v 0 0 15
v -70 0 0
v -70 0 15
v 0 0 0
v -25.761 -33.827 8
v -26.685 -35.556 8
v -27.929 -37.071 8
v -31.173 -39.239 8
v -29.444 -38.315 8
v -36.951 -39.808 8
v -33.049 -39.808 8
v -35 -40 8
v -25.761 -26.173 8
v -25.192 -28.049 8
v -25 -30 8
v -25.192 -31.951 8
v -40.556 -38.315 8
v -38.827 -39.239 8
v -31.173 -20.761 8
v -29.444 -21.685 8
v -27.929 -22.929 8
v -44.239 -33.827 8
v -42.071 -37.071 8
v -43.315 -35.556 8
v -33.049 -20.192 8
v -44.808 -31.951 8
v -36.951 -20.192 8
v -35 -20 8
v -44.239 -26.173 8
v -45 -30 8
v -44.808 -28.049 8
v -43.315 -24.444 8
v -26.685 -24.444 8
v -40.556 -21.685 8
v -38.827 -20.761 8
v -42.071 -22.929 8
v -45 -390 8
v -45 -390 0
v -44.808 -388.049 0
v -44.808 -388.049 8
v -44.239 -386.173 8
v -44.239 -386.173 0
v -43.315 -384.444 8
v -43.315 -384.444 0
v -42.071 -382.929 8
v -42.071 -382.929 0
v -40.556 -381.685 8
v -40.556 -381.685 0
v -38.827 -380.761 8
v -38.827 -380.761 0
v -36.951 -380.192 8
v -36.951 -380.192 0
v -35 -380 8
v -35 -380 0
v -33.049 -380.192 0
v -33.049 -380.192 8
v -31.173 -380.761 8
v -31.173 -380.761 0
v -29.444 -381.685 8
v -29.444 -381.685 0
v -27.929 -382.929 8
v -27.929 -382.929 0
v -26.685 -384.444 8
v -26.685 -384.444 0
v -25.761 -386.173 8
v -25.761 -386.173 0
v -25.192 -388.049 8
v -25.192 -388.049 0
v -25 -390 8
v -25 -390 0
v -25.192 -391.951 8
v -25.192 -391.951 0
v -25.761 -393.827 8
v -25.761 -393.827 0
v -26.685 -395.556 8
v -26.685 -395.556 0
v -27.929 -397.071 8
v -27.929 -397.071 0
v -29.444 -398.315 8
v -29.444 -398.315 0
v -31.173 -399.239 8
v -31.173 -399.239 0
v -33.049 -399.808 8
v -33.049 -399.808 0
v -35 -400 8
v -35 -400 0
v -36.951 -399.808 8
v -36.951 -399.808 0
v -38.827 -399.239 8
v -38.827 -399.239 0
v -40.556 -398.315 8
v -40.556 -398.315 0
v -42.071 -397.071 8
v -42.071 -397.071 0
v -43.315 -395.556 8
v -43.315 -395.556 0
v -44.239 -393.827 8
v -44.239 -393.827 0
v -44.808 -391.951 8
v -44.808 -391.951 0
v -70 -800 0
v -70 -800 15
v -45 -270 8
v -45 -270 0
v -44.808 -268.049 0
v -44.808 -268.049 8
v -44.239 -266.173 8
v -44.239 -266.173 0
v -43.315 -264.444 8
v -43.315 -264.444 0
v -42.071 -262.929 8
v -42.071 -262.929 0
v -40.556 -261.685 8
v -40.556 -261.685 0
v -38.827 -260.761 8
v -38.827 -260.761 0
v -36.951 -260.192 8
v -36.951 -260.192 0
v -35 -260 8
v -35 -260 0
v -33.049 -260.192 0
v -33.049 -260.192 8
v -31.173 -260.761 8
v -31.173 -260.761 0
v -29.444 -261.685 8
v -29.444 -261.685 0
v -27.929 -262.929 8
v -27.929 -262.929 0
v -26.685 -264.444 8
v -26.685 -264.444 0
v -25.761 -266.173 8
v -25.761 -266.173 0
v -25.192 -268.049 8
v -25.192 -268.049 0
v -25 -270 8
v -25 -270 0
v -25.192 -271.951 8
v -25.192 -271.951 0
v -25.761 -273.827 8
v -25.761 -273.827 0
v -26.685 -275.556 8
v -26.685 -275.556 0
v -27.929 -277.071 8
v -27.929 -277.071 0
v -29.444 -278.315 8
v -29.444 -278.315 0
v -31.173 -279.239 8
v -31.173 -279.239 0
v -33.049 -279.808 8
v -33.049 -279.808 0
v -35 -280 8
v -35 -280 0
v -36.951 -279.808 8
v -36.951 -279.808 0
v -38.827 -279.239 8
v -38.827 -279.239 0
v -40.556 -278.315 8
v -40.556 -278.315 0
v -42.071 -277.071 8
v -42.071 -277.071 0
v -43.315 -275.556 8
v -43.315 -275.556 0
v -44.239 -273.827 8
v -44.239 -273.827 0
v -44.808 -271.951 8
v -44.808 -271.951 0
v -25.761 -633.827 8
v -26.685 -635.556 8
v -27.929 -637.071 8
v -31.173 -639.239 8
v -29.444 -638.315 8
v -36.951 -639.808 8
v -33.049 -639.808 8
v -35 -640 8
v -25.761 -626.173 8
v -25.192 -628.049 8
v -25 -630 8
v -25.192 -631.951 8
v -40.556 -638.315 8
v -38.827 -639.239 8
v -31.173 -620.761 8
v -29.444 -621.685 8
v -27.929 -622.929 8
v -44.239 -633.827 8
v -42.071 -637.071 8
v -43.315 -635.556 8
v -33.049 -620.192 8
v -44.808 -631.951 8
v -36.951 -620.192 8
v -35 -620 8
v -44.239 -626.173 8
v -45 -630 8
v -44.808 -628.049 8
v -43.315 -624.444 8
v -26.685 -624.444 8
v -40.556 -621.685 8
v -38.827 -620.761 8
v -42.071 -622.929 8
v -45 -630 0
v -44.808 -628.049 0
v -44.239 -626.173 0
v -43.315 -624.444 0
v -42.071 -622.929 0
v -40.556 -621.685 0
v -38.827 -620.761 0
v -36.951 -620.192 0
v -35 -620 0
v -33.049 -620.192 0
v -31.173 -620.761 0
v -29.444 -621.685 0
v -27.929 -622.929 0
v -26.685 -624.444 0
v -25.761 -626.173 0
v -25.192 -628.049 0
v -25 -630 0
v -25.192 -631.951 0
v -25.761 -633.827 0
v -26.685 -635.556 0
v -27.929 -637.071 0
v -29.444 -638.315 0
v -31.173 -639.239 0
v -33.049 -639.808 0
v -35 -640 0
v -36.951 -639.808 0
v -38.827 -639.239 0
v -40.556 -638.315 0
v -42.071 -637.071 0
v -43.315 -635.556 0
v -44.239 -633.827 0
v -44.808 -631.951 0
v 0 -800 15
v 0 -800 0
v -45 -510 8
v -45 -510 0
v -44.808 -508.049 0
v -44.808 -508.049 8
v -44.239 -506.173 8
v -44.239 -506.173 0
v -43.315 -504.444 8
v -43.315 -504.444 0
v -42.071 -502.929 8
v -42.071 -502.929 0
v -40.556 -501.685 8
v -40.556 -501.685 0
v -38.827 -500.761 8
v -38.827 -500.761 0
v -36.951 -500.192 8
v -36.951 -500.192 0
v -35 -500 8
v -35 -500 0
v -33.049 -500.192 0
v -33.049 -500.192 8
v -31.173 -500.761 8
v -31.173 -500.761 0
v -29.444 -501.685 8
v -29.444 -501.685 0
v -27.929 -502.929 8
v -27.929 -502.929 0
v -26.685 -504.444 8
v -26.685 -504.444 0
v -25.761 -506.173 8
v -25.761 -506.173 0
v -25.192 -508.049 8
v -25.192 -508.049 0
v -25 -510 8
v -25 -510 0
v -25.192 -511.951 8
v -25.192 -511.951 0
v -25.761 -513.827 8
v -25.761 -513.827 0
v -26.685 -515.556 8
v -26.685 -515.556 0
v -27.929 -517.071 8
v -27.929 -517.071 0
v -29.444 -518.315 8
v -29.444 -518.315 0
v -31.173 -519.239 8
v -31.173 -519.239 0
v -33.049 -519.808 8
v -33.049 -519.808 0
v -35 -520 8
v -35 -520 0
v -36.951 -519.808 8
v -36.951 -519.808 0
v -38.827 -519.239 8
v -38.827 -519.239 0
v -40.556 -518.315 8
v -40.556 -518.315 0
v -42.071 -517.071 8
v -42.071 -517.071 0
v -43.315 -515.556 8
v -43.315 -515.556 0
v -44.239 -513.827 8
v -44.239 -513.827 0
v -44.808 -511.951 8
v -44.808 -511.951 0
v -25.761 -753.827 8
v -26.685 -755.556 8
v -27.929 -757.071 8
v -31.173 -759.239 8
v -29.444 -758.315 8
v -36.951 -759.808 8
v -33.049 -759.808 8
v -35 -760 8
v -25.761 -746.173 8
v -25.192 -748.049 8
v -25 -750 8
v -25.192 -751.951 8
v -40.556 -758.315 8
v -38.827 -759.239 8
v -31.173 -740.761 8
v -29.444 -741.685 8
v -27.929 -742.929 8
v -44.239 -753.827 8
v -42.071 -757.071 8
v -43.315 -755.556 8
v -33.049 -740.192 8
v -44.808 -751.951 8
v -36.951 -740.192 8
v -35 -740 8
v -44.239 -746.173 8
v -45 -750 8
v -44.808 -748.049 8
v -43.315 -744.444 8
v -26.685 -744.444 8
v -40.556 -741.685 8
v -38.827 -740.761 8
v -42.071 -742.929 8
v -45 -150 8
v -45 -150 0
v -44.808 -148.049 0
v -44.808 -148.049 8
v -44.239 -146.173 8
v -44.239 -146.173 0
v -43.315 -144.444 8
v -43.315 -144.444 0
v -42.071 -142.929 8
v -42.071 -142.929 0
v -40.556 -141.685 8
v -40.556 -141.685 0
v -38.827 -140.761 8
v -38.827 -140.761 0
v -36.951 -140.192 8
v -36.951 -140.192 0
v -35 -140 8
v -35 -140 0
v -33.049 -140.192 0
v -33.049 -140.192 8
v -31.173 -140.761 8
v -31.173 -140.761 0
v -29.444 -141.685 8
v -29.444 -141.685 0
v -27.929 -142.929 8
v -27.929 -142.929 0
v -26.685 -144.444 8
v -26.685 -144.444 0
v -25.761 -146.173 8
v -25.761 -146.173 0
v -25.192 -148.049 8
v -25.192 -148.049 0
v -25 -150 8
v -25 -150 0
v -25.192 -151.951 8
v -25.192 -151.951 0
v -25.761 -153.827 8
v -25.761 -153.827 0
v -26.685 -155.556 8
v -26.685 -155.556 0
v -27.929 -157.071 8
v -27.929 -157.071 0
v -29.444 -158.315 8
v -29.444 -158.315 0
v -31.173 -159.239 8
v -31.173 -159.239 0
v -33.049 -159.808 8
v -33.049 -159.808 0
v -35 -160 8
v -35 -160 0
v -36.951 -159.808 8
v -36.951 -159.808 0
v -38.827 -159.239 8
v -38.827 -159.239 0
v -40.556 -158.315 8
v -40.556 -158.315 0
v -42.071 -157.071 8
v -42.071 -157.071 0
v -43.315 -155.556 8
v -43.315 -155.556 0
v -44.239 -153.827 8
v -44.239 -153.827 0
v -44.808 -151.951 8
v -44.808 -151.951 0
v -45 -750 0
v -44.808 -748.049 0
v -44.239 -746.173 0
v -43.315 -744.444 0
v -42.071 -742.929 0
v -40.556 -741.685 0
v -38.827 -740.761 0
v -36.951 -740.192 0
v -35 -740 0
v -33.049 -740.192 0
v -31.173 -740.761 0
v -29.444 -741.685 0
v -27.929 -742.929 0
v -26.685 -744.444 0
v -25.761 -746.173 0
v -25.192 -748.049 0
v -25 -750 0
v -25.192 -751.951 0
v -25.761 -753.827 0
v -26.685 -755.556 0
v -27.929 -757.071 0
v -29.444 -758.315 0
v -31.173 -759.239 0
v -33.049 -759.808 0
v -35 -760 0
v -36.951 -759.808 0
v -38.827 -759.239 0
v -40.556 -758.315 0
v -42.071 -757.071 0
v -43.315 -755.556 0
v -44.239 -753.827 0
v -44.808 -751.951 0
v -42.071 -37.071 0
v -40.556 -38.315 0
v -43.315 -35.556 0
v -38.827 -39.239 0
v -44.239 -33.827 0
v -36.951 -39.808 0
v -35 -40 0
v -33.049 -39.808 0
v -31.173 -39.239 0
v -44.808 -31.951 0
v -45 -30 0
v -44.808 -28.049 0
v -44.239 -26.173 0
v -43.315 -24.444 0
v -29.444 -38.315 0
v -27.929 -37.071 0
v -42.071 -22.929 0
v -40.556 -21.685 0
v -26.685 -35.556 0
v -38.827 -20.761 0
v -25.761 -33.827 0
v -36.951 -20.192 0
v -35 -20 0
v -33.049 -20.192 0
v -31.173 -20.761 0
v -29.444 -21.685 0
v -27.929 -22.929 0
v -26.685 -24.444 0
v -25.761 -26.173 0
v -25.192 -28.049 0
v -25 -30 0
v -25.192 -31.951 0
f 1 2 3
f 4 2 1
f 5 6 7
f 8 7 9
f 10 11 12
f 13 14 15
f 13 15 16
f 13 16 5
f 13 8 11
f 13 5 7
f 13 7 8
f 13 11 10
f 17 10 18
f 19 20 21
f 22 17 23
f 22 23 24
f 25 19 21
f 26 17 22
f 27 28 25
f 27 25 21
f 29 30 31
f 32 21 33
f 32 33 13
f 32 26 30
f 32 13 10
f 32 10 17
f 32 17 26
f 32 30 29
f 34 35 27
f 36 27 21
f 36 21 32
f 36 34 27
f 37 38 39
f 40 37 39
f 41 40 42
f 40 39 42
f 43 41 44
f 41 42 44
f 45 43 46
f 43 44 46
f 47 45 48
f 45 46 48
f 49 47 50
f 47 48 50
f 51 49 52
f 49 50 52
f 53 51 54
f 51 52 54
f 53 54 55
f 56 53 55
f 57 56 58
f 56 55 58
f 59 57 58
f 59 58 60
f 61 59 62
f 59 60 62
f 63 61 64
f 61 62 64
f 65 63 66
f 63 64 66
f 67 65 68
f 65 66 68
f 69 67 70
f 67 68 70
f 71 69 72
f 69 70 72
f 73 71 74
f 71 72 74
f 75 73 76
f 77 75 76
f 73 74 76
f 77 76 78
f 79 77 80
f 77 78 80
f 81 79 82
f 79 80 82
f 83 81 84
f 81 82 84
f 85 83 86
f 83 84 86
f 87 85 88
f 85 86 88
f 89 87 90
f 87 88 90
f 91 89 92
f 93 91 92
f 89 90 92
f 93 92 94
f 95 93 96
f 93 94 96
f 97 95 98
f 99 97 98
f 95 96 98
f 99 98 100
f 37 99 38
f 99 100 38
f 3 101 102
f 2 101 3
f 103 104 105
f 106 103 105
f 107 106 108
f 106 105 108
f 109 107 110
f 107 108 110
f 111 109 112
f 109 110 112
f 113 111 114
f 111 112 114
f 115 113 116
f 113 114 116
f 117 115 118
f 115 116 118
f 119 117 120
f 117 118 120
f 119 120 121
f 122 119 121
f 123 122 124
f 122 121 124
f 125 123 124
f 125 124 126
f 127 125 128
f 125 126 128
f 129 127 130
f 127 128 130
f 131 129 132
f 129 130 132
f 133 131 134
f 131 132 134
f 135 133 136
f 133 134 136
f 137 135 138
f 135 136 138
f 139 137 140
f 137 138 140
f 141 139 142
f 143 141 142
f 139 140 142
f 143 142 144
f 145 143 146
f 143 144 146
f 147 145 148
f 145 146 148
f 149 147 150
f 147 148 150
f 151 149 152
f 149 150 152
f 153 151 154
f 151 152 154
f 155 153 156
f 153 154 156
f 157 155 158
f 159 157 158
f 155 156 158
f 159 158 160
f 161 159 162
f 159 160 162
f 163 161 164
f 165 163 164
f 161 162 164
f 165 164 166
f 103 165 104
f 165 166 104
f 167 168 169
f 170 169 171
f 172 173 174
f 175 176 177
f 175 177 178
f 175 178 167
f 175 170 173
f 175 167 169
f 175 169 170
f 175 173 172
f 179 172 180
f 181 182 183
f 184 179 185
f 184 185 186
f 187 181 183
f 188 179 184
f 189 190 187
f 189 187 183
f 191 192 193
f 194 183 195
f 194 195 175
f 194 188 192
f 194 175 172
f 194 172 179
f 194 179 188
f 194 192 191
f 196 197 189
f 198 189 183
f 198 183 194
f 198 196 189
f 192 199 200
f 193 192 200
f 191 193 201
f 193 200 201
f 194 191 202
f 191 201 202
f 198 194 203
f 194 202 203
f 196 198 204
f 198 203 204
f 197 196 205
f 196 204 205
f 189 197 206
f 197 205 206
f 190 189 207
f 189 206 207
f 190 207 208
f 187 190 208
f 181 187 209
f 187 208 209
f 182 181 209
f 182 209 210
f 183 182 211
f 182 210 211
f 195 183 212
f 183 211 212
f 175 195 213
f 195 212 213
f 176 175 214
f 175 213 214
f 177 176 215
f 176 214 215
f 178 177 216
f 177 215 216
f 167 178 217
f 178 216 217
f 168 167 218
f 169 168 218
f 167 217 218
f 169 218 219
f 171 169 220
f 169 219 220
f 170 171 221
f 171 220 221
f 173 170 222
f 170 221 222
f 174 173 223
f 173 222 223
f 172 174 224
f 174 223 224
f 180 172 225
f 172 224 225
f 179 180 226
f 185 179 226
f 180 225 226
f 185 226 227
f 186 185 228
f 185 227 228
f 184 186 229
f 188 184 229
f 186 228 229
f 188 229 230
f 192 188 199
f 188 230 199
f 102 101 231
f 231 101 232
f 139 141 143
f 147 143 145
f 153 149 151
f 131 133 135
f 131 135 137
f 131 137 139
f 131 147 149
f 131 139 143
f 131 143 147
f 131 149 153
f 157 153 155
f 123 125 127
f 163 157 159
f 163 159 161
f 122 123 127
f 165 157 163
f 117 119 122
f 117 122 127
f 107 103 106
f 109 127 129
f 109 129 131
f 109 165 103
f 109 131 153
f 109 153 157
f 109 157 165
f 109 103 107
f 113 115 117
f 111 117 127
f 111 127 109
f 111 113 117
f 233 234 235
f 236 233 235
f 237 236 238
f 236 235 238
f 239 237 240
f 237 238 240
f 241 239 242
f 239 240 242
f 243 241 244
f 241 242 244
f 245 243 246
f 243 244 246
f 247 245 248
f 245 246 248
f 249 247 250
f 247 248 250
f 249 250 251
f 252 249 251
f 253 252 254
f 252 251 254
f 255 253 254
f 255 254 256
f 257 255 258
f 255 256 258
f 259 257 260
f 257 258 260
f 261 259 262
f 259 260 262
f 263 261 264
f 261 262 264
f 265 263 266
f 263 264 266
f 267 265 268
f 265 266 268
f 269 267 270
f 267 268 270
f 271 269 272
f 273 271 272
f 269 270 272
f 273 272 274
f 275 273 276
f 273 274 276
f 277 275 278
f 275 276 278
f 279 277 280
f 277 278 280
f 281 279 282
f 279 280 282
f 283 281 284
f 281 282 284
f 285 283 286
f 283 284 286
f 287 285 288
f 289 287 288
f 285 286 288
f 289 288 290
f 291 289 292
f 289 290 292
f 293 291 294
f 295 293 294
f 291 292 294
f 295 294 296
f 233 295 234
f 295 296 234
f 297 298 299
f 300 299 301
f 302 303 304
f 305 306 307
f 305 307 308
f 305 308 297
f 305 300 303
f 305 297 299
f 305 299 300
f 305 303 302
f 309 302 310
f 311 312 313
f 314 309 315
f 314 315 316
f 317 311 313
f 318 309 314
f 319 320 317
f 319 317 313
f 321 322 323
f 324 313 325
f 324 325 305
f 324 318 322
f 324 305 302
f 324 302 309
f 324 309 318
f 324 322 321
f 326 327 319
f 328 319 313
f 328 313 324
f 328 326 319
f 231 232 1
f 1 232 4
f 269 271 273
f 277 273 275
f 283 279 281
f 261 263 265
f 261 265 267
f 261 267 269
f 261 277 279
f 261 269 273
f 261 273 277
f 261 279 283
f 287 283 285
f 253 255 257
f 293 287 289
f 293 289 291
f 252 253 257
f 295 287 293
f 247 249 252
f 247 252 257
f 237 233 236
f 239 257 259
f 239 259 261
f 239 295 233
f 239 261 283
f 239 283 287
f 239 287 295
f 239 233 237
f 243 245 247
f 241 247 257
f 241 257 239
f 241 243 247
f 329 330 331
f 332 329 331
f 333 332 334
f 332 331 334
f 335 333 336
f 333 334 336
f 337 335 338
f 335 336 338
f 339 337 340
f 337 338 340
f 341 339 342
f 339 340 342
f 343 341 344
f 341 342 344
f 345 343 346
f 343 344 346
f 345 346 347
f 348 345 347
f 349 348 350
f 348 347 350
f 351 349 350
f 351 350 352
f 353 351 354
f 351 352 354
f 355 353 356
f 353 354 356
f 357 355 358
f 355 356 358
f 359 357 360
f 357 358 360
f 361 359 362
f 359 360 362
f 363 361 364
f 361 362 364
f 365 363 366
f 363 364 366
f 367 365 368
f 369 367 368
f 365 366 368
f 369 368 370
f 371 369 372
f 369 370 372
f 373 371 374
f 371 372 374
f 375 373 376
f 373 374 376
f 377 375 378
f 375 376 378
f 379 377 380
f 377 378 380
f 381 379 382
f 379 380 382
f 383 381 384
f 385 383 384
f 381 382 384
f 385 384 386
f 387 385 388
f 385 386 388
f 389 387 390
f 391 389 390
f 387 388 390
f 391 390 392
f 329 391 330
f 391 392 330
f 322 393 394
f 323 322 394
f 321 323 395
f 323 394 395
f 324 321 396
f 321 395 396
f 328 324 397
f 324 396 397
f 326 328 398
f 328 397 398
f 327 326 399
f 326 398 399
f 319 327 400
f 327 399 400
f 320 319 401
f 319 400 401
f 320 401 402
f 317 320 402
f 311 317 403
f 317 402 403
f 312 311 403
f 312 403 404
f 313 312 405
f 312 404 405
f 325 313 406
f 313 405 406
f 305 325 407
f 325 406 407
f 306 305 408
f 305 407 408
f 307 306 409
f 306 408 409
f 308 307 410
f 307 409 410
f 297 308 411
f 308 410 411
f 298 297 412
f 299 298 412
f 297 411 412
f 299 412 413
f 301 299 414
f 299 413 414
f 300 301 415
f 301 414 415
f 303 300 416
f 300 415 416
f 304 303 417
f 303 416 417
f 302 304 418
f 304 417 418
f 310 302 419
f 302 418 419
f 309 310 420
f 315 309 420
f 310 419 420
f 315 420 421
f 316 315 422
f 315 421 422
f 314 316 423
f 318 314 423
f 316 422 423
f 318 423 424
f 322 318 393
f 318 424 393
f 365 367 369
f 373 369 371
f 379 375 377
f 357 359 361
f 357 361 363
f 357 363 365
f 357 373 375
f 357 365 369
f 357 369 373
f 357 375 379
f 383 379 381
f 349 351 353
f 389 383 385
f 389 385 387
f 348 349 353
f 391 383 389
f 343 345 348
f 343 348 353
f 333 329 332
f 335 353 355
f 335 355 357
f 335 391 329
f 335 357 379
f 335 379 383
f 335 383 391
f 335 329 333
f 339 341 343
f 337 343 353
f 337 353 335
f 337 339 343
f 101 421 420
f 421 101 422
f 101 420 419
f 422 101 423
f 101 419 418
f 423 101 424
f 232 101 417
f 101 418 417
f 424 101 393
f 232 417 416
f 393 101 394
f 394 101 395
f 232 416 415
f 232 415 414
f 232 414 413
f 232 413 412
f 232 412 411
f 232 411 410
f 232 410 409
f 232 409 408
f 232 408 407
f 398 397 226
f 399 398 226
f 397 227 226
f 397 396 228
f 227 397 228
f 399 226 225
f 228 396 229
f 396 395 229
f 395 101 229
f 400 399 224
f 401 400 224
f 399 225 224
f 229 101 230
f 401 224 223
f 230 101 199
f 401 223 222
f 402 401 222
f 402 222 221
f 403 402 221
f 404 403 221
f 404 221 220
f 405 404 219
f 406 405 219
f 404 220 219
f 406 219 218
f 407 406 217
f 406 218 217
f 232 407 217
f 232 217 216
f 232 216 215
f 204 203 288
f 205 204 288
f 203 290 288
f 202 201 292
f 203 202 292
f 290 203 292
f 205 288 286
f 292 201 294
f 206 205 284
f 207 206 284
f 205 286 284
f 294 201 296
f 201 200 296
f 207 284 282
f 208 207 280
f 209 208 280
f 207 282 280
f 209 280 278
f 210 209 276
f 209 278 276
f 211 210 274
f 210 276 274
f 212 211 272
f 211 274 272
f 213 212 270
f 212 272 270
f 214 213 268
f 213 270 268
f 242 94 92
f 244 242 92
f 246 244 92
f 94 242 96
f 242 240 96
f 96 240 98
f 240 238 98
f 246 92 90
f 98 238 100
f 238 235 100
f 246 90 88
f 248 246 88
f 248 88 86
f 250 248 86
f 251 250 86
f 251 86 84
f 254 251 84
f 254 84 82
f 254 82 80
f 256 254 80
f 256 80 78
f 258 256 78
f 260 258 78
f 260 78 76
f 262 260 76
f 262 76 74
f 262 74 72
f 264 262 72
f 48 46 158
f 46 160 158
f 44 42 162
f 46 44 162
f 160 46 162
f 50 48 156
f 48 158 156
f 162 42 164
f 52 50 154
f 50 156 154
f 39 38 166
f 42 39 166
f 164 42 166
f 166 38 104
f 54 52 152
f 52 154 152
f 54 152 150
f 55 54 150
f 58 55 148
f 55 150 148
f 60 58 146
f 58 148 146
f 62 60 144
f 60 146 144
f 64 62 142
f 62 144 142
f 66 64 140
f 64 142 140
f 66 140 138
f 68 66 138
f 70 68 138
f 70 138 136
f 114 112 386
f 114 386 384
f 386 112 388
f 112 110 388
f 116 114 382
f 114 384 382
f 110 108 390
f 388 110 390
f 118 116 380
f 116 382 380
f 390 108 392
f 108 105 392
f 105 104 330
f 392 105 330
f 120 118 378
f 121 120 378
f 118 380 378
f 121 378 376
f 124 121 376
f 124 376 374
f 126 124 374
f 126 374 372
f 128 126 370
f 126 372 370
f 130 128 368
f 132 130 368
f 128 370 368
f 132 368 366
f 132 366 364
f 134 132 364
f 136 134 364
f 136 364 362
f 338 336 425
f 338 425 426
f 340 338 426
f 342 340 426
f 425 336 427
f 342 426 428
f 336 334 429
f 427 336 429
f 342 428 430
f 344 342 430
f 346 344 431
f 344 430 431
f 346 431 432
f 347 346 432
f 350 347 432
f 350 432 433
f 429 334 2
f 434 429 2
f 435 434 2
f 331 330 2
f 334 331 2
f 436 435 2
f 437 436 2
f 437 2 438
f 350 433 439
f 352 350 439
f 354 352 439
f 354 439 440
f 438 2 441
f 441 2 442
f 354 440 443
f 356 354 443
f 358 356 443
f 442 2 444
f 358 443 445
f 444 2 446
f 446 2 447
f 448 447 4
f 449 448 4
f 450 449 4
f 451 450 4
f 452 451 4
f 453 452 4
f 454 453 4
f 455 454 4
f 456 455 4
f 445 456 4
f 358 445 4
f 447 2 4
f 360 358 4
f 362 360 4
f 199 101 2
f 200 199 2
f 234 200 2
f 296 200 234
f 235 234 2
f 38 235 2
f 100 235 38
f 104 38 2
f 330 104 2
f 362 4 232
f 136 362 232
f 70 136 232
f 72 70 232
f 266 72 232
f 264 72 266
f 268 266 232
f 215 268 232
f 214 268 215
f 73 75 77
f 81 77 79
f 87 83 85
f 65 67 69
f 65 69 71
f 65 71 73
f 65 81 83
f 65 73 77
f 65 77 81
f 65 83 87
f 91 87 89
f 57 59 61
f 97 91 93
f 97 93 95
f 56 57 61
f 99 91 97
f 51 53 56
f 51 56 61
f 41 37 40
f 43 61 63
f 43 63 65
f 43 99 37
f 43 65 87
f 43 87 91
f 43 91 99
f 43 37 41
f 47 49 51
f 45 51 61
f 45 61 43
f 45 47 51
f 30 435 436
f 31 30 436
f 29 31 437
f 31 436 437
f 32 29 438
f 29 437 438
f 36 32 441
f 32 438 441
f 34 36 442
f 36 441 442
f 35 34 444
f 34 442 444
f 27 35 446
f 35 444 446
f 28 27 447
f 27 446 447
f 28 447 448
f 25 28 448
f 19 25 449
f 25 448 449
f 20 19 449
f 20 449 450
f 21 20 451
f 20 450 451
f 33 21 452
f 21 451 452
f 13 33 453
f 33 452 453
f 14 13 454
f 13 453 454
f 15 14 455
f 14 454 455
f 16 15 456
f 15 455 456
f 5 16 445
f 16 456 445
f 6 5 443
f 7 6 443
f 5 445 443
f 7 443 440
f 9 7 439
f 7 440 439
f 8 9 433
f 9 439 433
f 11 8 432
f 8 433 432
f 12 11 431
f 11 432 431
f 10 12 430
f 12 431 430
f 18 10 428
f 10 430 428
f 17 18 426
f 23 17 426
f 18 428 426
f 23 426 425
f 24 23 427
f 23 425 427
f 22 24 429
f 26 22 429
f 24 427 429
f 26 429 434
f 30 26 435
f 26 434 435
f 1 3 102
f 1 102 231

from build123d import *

# Parameters (mm, degrees)
SKETCH3_W           = 70
SKETCH3_H           = 800
BOSS_EXTRUDE1_DEPTH = 15
SKETCH4_R           = 10
CUT_EXTRUDE1_DEPTH  = 8


with BuildPart() as part:
    # Sketch3 → Boss-Extrude1 (new body)
    with BuildSketch(Plane.XY):
        with Locations((-35, -400)):
            Rectangle(SKETCH3_W, SKETCH3_H)
    extrude(amount=BOSS_EXTRUDE1_DEPTH)

    # Sketch4 → Cut-Extrude1 (cut)
    with BuildSketch(Plane(origin=(0, 0, 0), x_dir=(-1, 0, 0), z_dir=(0, 0, -1))):
        with Locations((35, -30)):
            Circle(SKETCH4_R)
        with Locations((35, -150)):
            Circle(SKETCH4_R)
        with Locations((35, -270)):
            Circle(SKETCH4_R)
        with Locations((35, -390)):
            Circle(SKETCH4_R)
        with Locations((35, -510)):
            Circle(SKETCH4_R)
        with Locations((35, -630)):
            Circle(SKETCH4_R)
        with Locations((35, -750)):
            Circle(SKETCH4_R)
    extrude(amount=-CUT_EXTRUDE1_DEPTH, mode=Mode.SUBTRACT)


solid = part.part
